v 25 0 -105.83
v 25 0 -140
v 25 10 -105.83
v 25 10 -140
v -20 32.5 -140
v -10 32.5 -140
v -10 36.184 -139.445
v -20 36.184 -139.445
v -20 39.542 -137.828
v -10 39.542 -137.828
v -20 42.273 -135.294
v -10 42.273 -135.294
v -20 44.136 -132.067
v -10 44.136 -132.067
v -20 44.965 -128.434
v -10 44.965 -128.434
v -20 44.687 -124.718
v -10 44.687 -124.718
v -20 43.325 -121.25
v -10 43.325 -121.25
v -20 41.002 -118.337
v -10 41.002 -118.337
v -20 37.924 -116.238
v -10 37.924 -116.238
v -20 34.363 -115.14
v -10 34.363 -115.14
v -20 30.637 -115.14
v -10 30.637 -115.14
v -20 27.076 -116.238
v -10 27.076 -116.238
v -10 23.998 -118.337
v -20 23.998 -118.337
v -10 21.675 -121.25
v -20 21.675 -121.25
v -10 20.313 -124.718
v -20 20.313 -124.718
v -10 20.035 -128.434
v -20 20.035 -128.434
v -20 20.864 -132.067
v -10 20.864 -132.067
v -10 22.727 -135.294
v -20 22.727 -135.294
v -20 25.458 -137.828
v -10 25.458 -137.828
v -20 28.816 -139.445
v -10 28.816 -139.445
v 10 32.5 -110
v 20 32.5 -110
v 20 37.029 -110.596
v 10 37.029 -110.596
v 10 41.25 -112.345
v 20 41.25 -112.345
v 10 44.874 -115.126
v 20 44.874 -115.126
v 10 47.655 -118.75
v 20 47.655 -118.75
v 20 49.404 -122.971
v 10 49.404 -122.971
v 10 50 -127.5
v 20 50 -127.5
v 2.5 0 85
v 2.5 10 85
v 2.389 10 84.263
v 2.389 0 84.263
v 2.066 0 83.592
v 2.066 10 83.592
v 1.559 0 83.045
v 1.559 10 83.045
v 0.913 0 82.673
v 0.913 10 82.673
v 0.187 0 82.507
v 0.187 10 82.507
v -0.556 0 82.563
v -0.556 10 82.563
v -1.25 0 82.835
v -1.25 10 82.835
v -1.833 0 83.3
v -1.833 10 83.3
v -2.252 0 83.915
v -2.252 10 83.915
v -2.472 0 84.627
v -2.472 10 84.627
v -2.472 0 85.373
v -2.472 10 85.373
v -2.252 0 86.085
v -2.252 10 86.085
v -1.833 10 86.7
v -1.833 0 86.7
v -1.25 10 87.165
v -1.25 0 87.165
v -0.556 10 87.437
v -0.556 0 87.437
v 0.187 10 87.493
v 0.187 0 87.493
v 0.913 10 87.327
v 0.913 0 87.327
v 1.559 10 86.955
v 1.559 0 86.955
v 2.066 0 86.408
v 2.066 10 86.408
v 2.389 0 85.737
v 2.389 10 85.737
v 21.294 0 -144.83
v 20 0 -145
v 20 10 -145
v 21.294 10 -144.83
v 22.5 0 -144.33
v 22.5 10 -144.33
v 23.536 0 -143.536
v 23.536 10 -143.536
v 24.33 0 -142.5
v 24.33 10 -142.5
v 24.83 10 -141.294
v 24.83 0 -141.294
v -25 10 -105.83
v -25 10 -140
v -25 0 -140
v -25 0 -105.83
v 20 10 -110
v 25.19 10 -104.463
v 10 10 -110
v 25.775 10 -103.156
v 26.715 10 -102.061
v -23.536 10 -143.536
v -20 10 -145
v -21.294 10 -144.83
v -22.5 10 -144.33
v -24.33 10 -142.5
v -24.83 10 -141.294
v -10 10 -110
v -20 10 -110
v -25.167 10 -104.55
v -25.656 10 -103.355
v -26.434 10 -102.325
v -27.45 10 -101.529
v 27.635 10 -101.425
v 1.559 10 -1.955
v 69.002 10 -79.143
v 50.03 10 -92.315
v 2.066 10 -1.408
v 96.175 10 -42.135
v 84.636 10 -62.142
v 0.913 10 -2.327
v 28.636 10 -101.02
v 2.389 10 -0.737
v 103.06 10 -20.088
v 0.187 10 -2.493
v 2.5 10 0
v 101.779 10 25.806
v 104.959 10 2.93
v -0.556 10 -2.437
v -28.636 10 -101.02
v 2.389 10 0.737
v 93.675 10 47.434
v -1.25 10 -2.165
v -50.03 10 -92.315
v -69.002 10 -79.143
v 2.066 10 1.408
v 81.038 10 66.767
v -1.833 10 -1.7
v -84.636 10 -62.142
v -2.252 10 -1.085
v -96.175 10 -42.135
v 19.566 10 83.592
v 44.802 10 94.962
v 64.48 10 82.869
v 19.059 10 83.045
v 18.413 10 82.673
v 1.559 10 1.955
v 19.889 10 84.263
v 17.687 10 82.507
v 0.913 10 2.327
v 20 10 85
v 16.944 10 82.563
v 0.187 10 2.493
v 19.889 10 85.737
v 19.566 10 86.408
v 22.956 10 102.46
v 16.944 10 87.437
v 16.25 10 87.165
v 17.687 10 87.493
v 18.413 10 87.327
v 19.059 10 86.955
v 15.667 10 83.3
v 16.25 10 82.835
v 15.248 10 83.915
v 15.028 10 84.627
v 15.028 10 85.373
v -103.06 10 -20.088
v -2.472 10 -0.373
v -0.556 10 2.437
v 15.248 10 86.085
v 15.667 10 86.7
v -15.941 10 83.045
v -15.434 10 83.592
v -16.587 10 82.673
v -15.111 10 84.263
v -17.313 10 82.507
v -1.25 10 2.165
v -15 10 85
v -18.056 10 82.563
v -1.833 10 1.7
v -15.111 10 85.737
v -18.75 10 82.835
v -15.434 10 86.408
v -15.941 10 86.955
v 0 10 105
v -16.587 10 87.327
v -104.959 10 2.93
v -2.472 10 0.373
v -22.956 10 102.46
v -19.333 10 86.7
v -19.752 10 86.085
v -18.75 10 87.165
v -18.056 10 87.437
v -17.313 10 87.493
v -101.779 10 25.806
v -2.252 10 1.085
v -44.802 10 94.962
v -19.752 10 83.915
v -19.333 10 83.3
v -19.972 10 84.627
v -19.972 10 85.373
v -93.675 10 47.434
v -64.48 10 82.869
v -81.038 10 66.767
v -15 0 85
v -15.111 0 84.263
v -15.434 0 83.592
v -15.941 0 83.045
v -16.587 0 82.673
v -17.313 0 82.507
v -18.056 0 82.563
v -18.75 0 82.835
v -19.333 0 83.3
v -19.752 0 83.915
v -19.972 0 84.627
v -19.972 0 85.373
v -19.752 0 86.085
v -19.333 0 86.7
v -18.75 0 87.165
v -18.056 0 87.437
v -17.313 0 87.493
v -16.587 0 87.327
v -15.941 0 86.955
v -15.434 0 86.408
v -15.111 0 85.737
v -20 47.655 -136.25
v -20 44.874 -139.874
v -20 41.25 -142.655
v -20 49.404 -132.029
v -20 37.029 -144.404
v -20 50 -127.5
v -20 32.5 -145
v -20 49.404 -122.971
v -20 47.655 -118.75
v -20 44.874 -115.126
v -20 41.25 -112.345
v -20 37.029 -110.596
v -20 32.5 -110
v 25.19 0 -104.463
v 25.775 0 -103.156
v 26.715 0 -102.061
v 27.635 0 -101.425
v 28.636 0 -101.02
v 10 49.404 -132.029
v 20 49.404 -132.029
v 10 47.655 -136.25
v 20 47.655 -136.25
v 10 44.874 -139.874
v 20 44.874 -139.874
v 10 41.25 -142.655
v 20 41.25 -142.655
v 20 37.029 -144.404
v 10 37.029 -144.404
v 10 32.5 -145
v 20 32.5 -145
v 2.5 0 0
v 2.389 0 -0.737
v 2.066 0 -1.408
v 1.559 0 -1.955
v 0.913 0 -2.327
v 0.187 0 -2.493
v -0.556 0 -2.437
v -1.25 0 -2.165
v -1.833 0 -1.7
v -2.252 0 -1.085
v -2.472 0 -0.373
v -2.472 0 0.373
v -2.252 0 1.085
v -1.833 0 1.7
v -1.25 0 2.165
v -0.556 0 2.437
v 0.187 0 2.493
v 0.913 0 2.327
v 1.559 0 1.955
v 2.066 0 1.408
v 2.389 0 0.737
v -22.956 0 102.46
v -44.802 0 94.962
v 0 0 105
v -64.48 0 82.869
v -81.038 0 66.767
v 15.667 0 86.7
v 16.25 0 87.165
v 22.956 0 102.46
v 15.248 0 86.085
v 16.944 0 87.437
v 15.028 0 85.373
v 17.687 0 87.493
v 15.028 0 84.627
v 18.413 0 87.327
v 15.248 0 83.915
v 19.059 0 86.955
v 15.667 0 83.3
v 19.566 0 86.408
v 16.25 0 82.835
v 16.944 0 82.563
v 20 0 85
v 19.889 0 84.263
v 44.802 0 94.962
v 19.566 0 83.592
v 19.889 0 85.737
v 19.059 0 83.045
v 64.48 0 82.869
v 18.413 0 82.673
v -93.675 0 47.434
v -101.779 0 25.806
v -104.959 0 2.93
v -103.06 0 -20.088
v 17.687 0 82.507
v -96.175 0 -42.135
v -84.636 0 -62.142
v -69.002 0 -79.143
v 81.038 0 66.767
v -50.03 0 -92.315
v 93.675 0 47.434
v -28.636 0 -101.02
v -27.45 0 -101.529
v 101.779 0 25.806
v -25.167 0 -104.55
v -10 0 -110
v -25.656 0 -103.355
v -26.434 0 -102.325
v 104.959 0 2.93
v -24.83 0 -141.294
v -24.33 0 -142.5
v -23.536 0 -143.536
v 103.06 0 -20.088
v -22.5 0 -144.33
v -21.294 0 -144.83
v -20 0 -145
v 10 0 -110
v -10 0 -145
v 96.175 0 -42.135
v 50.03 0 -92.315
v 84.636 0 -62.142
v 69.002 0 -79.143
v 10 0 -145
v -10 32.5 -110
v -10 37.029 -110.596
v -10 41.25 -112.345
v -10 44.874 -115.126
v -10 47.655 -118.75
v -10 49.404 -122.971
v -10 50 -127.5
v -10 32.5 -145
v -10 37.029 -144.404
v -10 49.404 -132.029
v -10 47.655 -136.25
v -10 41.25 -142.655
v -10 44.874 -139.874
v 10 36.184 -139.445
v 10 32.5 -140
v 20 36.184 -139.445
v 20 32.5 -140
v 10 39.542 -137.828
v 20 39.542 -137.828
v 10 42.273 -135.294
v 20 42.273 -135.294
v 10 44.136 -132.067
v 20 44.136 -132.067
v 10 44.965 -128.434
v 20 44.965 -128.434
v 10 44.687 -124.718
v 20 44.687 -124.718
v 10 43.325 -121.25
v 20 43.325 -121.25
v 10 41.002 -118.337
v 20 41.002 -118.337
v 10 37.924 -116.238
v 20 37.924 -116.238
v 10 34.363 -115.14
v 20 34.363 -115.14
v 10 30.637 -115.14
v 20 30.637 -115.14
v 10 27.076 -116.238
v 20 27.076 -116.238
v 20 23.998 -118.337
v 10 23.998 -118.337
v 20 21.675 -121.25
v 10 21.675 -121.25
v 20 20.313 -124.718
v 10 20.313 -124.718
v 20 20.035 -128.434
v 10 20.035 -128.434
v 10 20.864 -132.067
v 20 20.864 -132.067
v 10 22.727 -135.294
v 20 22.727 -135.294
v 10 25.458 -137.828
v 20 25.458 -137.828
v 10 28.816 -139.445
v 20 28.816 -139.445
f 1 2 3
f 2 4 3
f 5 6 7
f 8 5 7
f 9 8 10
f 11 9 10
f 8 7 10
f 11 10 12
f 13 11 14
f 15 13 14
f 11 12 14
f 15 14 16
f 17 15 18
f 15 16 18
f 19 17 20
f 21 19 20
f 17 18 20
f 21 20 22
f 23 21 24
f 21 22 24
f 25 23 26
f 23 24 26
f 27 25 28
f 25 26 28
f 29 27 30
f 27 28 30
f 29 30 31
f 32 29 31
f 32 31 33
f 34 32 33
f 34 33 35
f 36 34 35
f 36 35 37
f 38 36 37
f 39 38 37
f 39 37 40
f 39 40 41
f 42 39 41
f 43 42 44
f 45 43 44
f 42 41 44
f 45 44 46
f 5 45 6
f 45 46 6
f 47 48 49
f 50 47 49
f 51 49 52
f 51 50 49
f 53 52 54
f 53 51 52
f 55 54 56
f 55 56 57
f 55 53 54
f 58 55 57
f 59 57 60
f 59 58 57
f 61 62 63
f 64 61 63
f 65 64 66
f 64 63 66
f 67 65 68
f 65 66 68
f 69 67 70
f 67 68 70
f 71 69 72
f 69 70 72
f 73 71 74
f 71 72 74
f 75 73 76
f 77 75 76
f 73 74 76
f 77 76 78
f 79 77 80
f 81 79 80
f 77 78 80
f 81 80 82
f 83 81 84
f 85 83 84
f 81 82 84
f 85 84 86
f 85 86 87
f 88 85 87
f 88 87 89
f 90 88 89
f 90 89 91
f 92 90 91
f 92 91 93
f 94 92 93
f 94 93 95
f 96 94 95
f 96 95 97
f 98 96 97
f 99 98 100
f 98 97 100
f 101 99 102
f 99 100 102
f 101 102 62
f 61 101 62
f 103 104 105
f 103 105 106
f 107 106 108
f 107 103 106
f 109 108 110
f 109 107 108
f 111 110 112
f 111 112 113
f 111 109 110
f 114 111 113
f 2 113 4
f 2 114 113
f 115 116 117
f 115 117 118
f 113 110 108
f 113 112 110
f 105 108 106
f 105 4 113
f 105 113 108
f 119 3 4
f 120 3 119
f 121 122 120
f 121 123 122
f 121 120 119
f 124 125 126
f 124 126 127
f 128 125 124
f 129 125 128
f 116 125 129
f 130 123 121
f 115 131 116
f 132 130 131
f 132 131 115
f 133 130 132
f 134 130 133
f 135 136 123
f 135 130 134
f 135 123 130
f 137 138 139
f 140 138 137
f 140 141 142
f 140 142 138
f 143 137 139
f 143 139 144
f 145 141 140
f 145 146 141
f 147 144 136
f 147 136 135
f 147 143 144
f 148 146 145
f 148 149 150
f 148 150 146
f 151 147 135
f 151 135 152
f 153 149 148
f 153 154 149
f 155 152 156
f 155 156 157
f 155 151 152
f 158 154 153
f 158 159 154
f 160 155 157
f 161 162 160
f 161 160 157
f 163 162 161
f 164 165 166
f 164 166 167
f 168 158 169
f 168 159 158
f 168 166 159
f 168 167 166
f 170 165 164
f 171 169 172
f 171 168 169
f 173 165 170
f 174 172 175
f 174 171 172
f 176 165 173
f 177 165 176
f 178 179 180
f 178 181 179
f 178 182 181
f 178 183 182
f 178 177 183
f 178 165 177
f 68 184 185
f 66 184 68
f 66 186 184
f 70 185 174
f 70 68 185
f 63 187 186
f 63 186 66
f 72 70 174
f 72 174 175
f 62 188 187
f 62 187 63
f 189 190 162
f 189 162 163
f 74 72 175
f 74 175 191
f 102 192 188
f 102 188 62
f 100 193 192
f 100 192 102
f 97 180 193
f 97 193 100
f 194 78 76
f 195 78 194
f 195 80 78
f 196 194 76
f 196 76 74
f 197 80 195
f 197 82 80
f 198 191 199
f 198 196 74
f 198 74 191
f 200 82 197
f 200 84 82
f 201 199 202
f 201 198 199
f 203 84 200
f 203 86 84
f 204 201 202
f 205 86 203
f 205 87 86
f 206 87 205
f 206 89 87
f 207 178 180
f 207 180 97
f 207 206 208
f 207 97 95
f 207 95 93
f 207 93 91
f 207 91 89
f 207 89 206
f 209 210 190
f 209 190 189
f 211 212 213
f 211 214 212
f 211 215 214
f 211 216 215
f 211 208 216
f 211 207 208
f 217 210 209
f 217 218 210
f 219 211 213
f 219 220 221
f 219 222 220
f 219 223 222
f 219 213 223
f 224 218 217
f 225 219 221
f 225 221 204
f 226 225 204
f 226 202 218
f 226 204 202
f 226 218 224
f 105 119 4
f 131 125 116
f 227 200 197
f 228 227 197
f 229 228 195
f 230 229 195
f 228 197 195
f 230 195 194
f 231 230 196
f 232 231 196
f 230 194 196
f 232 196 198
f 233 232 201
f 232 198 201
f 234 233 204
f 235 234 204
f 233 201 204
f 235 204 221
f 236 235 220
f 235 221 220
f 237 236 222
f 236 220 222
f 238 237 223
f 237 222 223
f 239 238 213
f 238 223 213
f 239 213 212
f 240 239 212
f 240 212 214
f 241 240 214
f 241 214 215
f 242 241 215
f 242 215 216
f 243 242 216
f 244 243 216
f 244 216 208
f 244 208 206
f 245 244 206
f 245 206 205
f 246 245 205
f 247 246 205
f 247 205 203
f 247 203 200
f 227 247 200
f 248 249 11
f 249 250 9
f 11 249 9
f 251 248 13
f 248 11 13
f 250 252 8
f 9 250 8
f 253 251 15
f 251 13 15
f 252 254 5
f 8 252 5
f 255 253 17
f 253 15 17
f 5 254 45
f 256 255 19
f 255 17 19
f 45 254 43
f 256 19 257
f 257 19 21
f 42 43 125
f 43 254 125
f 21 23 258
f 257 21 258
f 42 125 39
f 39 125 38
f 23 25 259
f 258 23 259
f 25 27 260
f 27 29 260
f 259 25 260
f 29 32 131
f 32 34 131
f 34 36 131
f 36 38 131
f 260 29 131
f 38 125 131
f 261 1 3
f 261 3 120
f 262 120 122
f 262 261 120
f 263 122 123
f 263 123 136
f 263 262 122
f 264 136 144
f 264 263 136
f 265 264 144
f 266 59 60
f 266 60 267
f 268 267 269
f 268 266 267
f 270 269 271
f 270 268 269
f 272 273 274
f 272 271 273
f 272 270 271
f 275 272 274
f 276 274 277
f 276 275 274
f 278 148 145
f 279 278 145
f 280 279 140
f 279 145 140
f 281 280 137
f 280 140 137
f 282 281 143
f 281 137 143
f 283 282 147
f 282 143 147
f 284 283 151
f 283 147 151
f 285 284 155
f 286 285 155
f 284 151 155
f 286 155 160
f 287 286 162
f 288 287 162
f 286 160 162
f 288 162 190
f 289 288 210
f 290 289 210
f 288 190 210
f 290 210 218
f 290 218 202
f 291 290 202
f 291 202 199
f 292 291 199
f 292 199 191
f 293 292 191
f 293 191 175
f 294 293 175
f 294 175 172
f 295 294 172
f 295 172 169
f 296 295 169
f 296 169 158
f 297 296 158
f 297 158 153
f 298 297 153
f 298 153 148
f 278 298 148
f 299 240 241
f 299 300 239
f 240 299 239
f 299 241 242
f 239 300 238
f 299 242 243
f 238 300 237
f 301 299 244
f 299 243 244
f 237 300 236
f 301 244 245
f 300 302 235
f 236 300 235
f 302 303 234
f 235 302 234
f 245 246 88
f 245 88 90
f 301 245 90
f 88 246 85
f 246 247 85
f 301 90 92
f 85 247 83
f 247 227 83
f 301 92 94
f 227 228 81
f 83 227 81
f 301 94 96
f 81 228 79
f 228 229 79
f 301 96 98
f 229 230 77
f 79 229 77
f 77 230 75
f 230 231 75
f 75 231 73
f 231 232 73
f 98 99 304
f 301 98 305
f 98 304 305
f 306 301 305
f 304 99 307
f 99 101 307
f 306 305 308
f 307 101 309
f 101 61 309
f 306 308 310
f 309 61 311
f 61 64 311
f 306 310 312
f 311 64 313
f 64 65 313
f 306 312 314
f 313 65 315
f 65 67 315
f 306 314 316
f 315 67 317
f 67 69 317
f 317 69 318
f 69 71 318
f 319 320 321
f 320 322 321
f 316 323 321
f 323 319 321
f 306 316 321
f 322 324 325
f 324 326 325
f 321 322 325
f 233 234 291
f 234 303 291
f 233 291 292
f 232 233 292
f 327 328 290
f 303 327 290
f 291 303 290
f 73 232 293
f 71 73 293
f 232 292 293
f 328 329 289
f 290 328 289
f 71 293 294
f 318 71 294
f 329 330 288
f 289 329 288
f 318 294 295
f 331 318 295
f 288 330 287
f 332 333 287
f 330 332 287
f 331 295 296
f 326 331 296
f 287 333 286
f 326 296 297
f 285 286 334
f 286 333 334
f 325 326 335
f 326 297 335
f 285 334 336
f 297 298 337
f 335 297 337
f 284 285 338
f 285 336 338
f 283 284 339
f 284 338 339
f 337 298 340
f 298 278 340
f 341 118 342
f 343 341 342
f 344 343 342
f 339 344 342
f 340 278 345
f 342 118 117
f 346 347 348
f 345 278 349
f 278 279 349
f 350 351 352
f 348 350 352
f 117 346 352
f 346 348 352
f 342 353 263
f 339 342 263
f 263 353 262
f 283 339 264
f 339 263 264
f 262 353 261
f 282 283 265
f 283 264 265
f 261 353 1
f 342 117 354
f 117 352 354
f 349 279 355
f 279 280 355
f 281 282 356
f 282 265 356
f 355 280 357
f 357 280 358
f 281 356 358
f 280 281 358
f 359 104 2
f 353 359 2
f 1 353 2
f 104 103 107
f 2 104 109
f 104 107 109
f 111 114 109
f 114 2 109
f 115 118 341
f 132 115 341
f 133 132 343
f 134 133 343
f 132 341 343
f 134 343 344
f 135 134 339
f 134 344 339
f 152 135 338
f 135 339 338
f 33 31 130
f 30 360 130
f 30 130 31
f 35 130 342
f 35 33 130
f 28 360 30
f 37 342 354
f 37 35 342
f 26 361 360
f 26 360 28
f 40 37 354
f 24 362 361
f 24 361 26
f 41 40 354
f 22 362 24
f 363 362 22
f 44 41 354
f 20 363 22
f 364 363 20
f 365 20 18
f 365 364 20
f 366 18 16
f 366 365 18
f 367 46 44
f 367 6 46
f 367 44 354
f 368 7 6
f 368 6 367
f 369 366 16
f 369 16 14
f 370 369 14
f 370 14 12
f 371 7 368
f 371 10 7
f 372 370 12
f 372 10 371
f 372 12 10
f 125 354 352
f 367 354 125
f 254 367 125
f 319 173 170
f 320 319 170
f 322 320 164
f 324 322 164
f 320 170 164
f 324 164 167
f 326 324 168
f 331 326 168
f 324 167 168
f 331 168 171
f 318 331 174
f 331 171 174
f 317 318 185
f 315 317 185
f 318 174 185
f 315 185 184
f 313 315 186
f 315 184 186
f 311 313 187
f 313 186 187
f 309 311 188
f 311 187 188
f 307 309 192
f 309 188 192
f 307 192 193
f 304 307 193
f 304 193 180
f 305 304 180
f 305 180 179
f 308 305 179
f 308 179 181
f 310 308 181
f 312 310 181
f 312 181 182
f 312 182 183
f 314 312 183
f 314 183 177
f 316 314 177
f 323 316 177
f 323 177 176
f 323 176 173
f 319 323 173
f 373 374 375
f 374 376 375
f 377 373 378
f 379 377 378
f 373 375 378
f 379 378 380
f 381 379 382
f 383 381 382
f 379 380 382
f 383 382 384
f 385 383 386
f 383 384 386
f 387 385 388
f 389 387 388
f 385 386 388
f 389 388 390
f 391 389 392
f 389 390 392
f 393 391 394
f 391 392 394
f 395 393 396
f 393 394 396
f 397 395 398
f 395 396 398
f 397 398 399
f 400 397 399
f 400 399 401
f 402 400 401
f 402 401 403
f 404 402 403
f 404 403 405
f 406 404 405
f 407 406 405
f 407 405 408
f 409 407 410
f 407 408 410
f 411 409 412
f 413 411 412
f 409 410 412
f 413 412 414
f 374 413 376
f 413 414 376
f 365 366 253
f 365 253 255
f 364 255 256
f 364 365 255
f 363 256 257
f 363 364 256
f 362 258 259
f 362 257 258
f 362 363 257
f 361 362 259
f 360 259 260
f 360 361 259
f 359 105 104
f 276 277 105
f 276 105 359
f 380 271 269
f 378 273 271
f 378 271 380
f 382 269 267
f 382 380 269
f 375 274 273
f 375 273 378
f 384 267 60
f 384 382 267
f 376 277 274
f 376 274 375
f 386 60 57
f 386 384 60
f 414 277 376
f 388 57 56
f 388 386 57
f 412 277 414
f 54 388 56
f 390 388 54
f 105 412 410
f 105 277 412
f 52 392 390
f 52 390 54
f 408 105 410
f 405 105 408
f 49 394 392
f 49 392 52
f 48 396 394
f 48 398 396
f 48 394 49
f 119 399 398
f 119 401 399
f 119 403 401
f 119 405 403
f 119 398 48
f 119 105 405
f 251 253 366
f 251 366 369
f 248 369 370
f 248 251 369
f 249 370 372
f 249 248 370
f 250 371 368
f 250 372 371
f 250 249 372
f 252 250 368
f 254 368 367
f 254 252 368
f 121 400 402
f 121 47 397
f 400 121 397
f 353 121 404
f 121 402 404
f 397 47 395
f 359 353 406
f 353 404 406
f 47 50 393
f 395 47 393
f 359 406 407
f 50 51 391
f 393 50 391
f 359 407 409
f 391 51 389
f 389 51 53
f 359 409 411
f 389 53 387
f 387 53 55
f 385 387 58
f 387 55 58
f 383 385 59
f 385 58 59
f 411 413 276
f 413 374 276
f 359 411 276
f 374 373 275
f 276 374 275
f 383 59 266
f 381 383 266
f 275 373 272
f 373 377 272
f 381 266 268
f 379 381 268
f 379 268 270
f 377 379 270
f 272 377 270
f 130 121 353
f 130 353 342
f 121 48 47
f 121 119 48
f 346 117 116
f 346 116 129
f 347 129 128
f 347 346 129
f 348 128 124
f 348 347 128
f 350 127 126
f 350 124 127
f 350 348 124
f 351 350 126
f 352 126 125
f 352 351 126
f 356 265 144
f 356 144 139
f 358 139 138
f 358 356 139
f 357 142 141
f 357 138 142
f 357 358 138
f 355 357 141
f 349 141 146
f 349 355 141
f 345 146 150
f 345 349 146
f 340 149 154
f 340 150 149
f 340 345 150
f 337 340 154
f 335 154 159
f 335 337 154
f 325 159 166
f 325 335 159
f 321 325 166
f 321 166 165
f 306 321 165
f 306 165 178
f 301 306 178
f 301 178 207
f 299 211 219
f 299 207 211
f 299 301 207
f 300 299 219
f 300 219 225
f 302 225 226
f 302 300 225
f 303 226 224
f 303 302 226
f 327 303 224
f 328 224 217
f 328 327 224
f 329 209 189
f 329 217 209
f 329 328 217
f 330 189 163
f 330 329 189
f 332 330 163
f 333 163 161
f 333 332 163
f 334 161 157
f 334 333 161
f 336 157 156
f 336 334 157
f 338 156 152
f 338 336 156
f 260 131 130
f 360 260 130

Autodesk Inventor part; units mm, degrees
ref_plane "YZ Plane" through (0, 0, 0) normal (1, 0, 0) x (0, 1, 0)
ref_plane "XZ Plane" through (0, 0, 0) normal (0, 1, 0) x (-1, 0, 0)
ref_plane "XY Plane" through (0, 0, 0) normal (0, 0, 1) x (1, 0, 0)
sketch "Sketch1" plane through (0, 0, 0) normal (0, 1, 0) x (-1, 0, 0)
  circle A0 centre (0, 0) radius 105
  dimension "d0" = 210
extrude "Extrusion1" add sketch "Sketch1" along normal blind 10
sketch "Sketch2" plane through (0, 10, 0) normal (0, 1, 0) x (1, 0, 0)
  line L0 (-79.8594, -68.6516) -> (79.5179, -68.6516)
  line L1 (0, 0) -> (0, -80)
  line L2 (0, -80) -> (0, -60)
  line L3 (0, -60) -> (17.5, -60)
  line L4 (0, -60) -> (-17.5, -60)
  circle A0 centre (-17.5, -60) radius 2.5
  circle A1 centre (0, -60) radius 2.5
  circle A2 centre (17.5, -60) radius 2.5
  dimension "d4" = 80
  dimension "d5" = 20
  dimension "d6" = 17.5
  dimension "d7" = 17.5
  dimension "d8" = 5
  dimension "d9" = 5
  dimension "d10" = 5
extrude "Extrusion2" cut sketch "Sketch2" against normal blind 10
sketch "Sketch3" plane through (0, 10, 0) normal (0, 1, 0) x (1, 0, 0)
  circle A0 centre (0, 0) radius 2.5
  dimension "d13" = 5
extrude "Extrusion3" cut sketch "Sketch3" against normal blind 10
sketch "Sketch4" plane through (0, 10, 0) normal (0, 1, 0) x (1, 0, 0)
  circle A0 centre (0, 0) radius 2.5 projected
  line L0 (0, 0) -> (0, 80)
  line L1 (-15, 80) -> (-15, 65)
  line L2 (-15, 65) -> (15, 65)
  line L3 (15, 65) -> (15, 95)
  line L4 (15, 95) -> (-15, 95)
  line L5 (-15, 95) -> (-15, 80)
  line L6 (0, 80) -> (-7.5, 80)
  line L7 (-7.5, 80) -> (7.5, 80)
  line L8 (7.5, 80) -> (7.5, 95)
  line L9 (7.5, 80) -> (7.5, 65)
  line L10 (-7.5, 80) -> (-7.5, 95)
  line L11 (-7.5, 80) -> (-7.5, 65)
  dimension "d20" = 15
  dimension "d21" = 15
  dimension "d22" = 30
  dimension "d23" = 30
  dimension "d24" = 7.5
  dimension "d25" = 15
extrude "Extrusion4" add sketch "Sketch4" along normal blind 30 contours L2 L11 L6 L0 | L0 L7 L9 L2 | L6 L10 L4 L8 L7
sketch "Sketch5" plane through (7.5, 10, -65) normal (1, 0, 0) x (0, 0, -1)
  line L0 (40, 0) -> (-170, 0) projected
  line L1 (40, 0) -> (15, 0)
  line L2 (15, 0) -> (15, 15)
  circle A0 centre (15, 15) radius 7.5
  line L3 (30, 0) -> (30, 30) projected
  arc A1 (30, 15) -> (0, 15) centre (15, 15) ccw
  line L4 (15, 15) -> (0, 15) construction
  line L5 (15, 15) -> (30, 15) construction
  line L6 (0, 0) -> (0, 30) projected
  line L7 (0, 15) -> (0, 30)
  line L8 (0, 30) -> (30, 30) projected
  line L9 (0, 30) -> (30, 30)
  line L10 (30, 30) -> (30, 15)
  point P0 (-65, -10)
  point P1 (15, 30)
  dimension "d28" = 25
  dimension "d29" = 15
  dimension "d30" = 15
  dimension "d31" = 180
extrude "Extrusion5" cut sketch "Sketch5" against normal blind 30 contours A1 L8 L3 | A1 L6 L8 | A0
sketch "Sketch6" plane through (7.5, 10, -65) normal (1, 0, 0) x (0, 0, -1)
  circle A0 centre (15, 15) radius 7.5 projected
  circle A1 centre (15, 15) radius 5
  circle A2 centre (15, 15) radius 7.5
  point P0 (-65, -10)
  dimension "d34" = 10
extrude "Extrusion6" add sketch "Sketch6" against normal blind 15
sketch "Sketch7" plane through (7.5, 10, -65) normal (1, 0, 0) x (0, 0, -1)
  line L0 (0, 0) -> (30, 0) projected
  line L1 (0, 0) -> (30, 0)
  line L2 (30, 0) -> (30, 34.6991)
  line L3 (30, 34.6991) -> (0, 34.6991)
  line L4 (0, 34.6991) -> (0, 0)
  point P0 (-65, -10)
extrude "Extrusion7" cut sketch "Sketch7" against normal blind 15
sketch "Sketch8" plane through (0, 10, 0) normal (0, 1, 0) x (1, 0, 0)
  circle A0 centre (0, 0) radius 2.5 projected
  line L0 (0, 0) -> (0, 100)
  line L1 (0, 100) -> (-10, 100)
  line L2 (-10, 100) -> (-20, 100)
  line L3 (-20, 100) -> (-20, 65)
  line L4 (-20, 65) -> (-10, 65)
  line L5 (-10, 65) -> (-10, 100)
  line L6 (0, 100) -> (10, 100)
  line L7 (10, 100) -> (20, 100)
  line L8 (20, 100) -> (20, 65)
  line L9 (20, 65) -> (10, 65)
  line L10 (10, 65) -> (10, 100)
  dimension "d42" = 100
  dimension "d43" = 10
  dimension "d44" = 10
  dimension "d45" = 35
  dimension "d46" = 10
  dimension "d47" = 10
  dimension "d48" = 35
extrude "Extrusion8" add sketch "Sketch8" along normal blind 35 contours L5 L4 L3 L2 | L7 L8 L9 L10
thicken "Thicken1" operation add thickness 5 both sides no extend neighbours yes toward (0, 1, 0) faces at (13.3333, 45, -88.3333)
thicken "Thicken2" operation add thickness 5 both sides no extend neighbours yes toward (0, 1, 0) faces at (-16.6667, 45, -88.3333)
sketch "Sketch10" plane through (20, 10, -65) normal (1, 0, 0) x (0, 0, -1)
  line L0 (0, 0) -> (35, 0) projected
  line L1 (0, 0) -> (17.5, 0)
  line L2 (17.5, 0) -> (17.5, 22.5)
  circle A0 centre (17.5, 22.5) radius 12.5
  circle A1 centre (17.5, 22.5) radius 17.5
  line L3 (35, 0) -> (35, 40) projected
  line L4 (0, 0) -> (0, 40) projected
  line L5 (0, 22.5) -> (0, 40)
  line L6 (35, 40) -> (0, 40) projected
  line L7 (0, 40) -> (35, 40)
  line L8 (35, 40) -> (35, 22.5)
  point P0 (-65, -10)
  point P1 (17.5, 40)
  dimension "d60" = 22.5
  dimension "d61" = 25
extrude "Extrusion9" cut sketch "Sketch10" against normal blind 40 contours L4 L6 A1 | L6 L3 A1 | A0
sketch "Sketch11" plane through (20, 10, -65) normal (1, 0, 0) x (0, 0, -1)
  line L0 (40, 0) -> (-170, 0) projected
  line L1 (35.2175, 0) -> (0.2175, 0)
  line L2 (0.2175, 0) -> (-34.7825, 0)
  line L3 (0.2175, 0) -> (40.2175, 0)
  circle A0 centre (40.2175, 17.5) radius 12.5
  circle A1 centre (40.2175, 17.5) radius 17.5
  line L4 (-34.7825, 0) -> (32.4725, 33.1928)
  point P0 (-65, -10)
  dimension "d73" = 35
  dimension "d74" = 35
  dimension "d75" = 40
  dimension "d78" = 35
sketch "Sketch12" plane through (-20, 10, -100) normal (-1, 0, 0) x (0, 0, 1)
  line L0 (205, 0) -> (-5, 0) projected
  line L1 (37.401, 0) -> (37.401, 45.2729)
  line L2 (37.401, 45.2729) -> (-3.1543, 48.8051)
  line L3 (-3.1543, 48.8051) -> (-3.1543, 0)
  line L4 (37.401, 0) -> (-3.1543, 0)
  point P0 (100, -10)
extrude "Extrusion10" cut sketch "Sketch12" against normal blind 40
extrude "Extrusion11" add sketch "Sketch11" against normal blind 40
sketch "Sketch13" plane through (0, 0, 0) normal (0, 0, 1) x (1, 0, 0)
  line L0 (105, 10) -> (-105, 10) projected
  line L1 (0, 10) -> (10, 10)
  line L2 (10, 10) -> (10, 48.8421)
  line L3 (20, 43.1928) -> (-20, 43.1928) projected
  line L4 (10, 48.8421) -> (-10, 48.8421)
  line L5 (-10, 48.8421) -> (-10, 10)
  line L6 (-10, 10) -> (10, 10)
  point P0 (0, 0)
  point P1 (-20, 10)
  point P2 (20, 10)
  dimension "d83" = 10
  dimension "d84" = 20
extrude "Extrusion12" cut sketch "Sketch13" against normal blind 150
sketch "Sketch14" plane through (20, 10, -65) normal (1, 0, 0) x (0, 0, -1)
  line L0 (38.0776, 0) -> (-34.7825, 0) projected
  line L1 (-34.7825, 0) -> (42.8397, 49.7383)
  line L2 (42.8397, 49.7383) -> (77.8644, 0)
  line L3 (77.8644, 0) -> (-34.7825, 0)
  point P0 (-65, -10)
extrude "Extrusion13" cut sketch "Sketch14" against normal blind 150
sketch "Sketch15" plane through (0, 10, 0) normal (0, 1, 0) x (1, 0, 0)
  circle A0 centre (0, 0) radius 2.5 projected
  line L0 (0, 0) -> (0, 100)
  line L1 (0, 100) -> (-20, 100)
  line L2 (-20, 100) -> (-20, 65)
  line L3 (-20, 65) -> (-10, 65)
  line L4 (-10, 65) -> (-10, 100)
  line L5 (-10, 65) -> (10, 65)
  line L6 (10, 65) -> (20, 65)
  line L7 (20, 65) -> (20, 100)
  line L8 (20, 100) -> (10, 100)
  line L9 (10, 100) -> (10, 65)
  dimension "d89" = 100
  dimension "d90" = 20
  dimension "d91" = 35
  dimension "d92" = 10
  dimension "d93" = 20
  dimension "d94" = 10
  dimension "d95" = 35
  dimension "d96" = 10
extrude "Extrusion14" add sketch "Sketch15" along normal blind 40 contours L3 L2 L1 L4 | L9 L8 L7 L6
sketch "Sketch16" plane through (20, 10, -65) normal (1, 0, 0) x (0, 0, -1)
  line L0 (0, 40) -> (35, 40) projected
  line L1 (17.5, 40) -> (17.5, 22.5)
  circle A0 centre (17.5, 22.5) radius 12.5
  circle A1 centre (17.5, 22.5) radius 17.5
  line L2 (35, 0) -> (35, 40) projected
  line L3 (0, 0) -> (0, 40) projected
  line L4 (0, 22.5) -> (0, 40)
  line L5 (0, 40) -> (35, 40)
  line L6 (35, 40) -> (35, 22.5)
  point P0 (-65, -10)
  dimension "d99" = 17.5
  dimension "d100" = 25
extrude "Extrusion15" cut sketch "Sketch16" against normal blind 40 contours L0 A1 L3 | L0 L2 A1 | A0
sketch "Sketch18" plane through (0, 10, 0) normal (0, 1, 0) x (1, 0, 0)
  line L0 (-10, 65) -> (-20, 65) projected
  line L1 (10, 65) -> (10, 100) projected
  line L2 (-10, 65) -> (10, 65)
  line L3 (10, 65) -> (10, 111.2793)
  line L4 (10, 111.2793) -> (-10, 111.2793)
  line L5 (-10, 100) -> (-10, 65) projected
  line L6 (-10, 111.2793) -> (-10, 65)
  point P0 (0, 0)
extrude "Extrusion17" cut sketch "Sketch18" against normal blind 40
sketch "Sketch19" plane through (0, 10, 0) normal (0, 1, 0) x (1, 0, 0)
  circle A0 centre (0, 0) radius 2.5 projected
  line L0 (0, 0) -> (0, -85)
  circle A1 centre (0, -85) radius 2.5
  circle A2 centre (17.5, -85) radius 2.5
  circle A3 centre (-17.5, -85) radius 2.5
  dimension "d119" = 85
  dimension "d120" = 5
  dimension "d121" = 5
  dimension "d122" = 5
extrude "Extrusion18" cut sketch "Sketch19" against normal blind 10 contours A1 | A2 | A3
sketch "Sketch20" plane through (0, 10, 0) normal (0, 1, 0) x (1, 0, 0)
  circle A0 centre (0, -60.0339) radius 2.5
  circle A1 centre (17.5, -60) radius 2.5 projected
  circle A2 centre (17.5, -60) radius 2.5
  circle A3 centre (-17.5, -60) radius 2.5 projected
  circle A4 centre (-17.5, -60) radius 2.5
  point P0 (0, 0)
  dimension "d125" = 5
  dimension "d126" = 5
  dimension "d127" = 5
extrude "Extrusion19" add sketch "Sketch20" against normal blind 10
sketch "Sketch21" plane through (0, 10, 0) normal (0, 1, 0) x (1, 0, 0)
  circle A0 centre (0, -62.5) radius 12.6485
  point P0 (0, 0)
extrude "Extrusion20" add sketch "Sketch21" against normal blind 10
sketch "Sketch28" plane through (0, 10, 0) normal (0, 1, 0) x (1, 0, 0)
  line L0 (0, 0) -> (0, 145)
  line L1 (0, 145) -> (-25, 145)
  line L2 (-25, 145) -> (-25, 58.6582)
  line L3 (-25, 58.6582) -> (25.7597, 58.6582)
  line L4 (25.7597, 58.6582) -> (25.7597, 145)
  line L5 (25.7597, 145) -> (0, 145)
  dimension "d165" = 145
  dimension "d166" = 25
extrude "Extrusion27" add sketch "Sketch28" against normal blind 10
sketch "Sketch29" plane through (0, 10, 0) normal (0, 1, 0) x (1, 0, 0)
  line L0 (0, 56.8176) -> (-28.7063, 61.8747)
  line L1 (-28.7063, 61.8747) -> (-21.0018, 105.6086)
  line L2 (-21.0018, 105.6086) -> (22.7568, 105.6086)
  line L3 (22.7568, 105.6086) -> (27.8138, 56.8176)
  line L4 (27.8138, 56.8176) -> (0, 56.8176)
  point P0 (0, 0)
extrude "Extrusion28" cut sketch "Sketch29" along normal blind 40
sketch "Sketch30" plane through (0, 10, 0) normal (0, 1, 0) x (1, 0, 0)
  line L0 (25.7597, 145) -> (-25, 145) projected
  line L1 (-25, 145) -> (-10, 145)
  line L2 (-10, 145) -> (10, 145)
  line L3 (0, 145) -> (-10, 145)
  line L4 (-10, 145) -> (-20, 145)
  line L5 (-20, 145) -> (-20, 110)
  line L6 (-20, 110) -> (-10, 110)
  line L7 (-10, 110) -> (-10, 145)
  line L8 (0, 145) -> (10, 145)
  line L9 (10, 145) -> (20, 145)
  line L10 (20, 145) -> (20, 110)
  line L11 (20, 110) -> (10, 110)
  line L12 (10, 110) -> (10, 145)
  point P0 (0, 0)
  dimension "d173" = 10
  dimension "d174" = 10
  dimension "d175" = 35
  dimension "d176" = 10
  dimension "d177" = 10
  dimension "d178" = 10
extrude "Extrusion29" add sketch "Sketch30" along normal blind 40
fillet "Fillet4" radius 17.5 4 edges at (15, 50, -145) (15, 50, -110) (-15, 50, -110) (-15, 50, -145)
sketch "Sketch31" plane through (0, 10, 0) normal (0, 1, 0) x (1, 0, 0)
  line L0 (-25, 145) -> (25.7597, 145) projected
  line L1 (0, 145) -> (-25, 145)
  line L2 (0, 145) -> (25, 145)
  circle A0 centre (0, 0) radius 2.5 projected
  circle A1 centre (0, 0) radius 105
  line L3 (25, 145) -> (25, 101.9804)
  line L4 (25, 145) -> (25.7597, 145)
  line L5 (25.7597, 145) -> (25.7597, 101.7911)
  dimension "d182" = 25
  dimension "d183" = 25
  dimension "d184" = 210
extrude "Extrusion30" cut sketch "Sketch31" against normal blind 40 contours L0 L5 A1 L3
sketch "Sketch32" plane through (20, 10, -110) normal (1, 0, 0) x (0, 0, -1)
  arc A0 (35, 22.5) -> (0, 22.5) centre (17.5, 22.5) ccw projected
  circle A1 centre (17.5, 22.5) radius 12.5
  point P0 (-110, -10)
  dimension "d187" = 25
extrude "Extrusion31" cut sketch "Sketch32" against normal blind 40
fillet "Fillet5" radius 5 4 edges at (25, 5, -145) (25, 5, -101.9804) (-25, 5, -145) (-25, 5, -101.9804)
sketch "Sketch33" plane through (0, 10, 0) normal (0, 1, 0) x (1, 0, 0)
  line L0 (10, 110) -> (20, 110) projected
  line L1 (10, 110) -> (-10, 110)
  line L2 (-10, 110) -> (-10, 145)
  line L3 (-10, 145) -> (10, 145)
  line L4 (10, 110) -> (10, 145) projected
  line L5 (10, 145) -> (10, 110)
  point P0 (0, 0)
  dimension "d191" = 20
  dimension "d192" = 35
extrude "Extrusion32" cut sketch "Sketch33" against normal blind 40
properties part number "Base do telescópio"
